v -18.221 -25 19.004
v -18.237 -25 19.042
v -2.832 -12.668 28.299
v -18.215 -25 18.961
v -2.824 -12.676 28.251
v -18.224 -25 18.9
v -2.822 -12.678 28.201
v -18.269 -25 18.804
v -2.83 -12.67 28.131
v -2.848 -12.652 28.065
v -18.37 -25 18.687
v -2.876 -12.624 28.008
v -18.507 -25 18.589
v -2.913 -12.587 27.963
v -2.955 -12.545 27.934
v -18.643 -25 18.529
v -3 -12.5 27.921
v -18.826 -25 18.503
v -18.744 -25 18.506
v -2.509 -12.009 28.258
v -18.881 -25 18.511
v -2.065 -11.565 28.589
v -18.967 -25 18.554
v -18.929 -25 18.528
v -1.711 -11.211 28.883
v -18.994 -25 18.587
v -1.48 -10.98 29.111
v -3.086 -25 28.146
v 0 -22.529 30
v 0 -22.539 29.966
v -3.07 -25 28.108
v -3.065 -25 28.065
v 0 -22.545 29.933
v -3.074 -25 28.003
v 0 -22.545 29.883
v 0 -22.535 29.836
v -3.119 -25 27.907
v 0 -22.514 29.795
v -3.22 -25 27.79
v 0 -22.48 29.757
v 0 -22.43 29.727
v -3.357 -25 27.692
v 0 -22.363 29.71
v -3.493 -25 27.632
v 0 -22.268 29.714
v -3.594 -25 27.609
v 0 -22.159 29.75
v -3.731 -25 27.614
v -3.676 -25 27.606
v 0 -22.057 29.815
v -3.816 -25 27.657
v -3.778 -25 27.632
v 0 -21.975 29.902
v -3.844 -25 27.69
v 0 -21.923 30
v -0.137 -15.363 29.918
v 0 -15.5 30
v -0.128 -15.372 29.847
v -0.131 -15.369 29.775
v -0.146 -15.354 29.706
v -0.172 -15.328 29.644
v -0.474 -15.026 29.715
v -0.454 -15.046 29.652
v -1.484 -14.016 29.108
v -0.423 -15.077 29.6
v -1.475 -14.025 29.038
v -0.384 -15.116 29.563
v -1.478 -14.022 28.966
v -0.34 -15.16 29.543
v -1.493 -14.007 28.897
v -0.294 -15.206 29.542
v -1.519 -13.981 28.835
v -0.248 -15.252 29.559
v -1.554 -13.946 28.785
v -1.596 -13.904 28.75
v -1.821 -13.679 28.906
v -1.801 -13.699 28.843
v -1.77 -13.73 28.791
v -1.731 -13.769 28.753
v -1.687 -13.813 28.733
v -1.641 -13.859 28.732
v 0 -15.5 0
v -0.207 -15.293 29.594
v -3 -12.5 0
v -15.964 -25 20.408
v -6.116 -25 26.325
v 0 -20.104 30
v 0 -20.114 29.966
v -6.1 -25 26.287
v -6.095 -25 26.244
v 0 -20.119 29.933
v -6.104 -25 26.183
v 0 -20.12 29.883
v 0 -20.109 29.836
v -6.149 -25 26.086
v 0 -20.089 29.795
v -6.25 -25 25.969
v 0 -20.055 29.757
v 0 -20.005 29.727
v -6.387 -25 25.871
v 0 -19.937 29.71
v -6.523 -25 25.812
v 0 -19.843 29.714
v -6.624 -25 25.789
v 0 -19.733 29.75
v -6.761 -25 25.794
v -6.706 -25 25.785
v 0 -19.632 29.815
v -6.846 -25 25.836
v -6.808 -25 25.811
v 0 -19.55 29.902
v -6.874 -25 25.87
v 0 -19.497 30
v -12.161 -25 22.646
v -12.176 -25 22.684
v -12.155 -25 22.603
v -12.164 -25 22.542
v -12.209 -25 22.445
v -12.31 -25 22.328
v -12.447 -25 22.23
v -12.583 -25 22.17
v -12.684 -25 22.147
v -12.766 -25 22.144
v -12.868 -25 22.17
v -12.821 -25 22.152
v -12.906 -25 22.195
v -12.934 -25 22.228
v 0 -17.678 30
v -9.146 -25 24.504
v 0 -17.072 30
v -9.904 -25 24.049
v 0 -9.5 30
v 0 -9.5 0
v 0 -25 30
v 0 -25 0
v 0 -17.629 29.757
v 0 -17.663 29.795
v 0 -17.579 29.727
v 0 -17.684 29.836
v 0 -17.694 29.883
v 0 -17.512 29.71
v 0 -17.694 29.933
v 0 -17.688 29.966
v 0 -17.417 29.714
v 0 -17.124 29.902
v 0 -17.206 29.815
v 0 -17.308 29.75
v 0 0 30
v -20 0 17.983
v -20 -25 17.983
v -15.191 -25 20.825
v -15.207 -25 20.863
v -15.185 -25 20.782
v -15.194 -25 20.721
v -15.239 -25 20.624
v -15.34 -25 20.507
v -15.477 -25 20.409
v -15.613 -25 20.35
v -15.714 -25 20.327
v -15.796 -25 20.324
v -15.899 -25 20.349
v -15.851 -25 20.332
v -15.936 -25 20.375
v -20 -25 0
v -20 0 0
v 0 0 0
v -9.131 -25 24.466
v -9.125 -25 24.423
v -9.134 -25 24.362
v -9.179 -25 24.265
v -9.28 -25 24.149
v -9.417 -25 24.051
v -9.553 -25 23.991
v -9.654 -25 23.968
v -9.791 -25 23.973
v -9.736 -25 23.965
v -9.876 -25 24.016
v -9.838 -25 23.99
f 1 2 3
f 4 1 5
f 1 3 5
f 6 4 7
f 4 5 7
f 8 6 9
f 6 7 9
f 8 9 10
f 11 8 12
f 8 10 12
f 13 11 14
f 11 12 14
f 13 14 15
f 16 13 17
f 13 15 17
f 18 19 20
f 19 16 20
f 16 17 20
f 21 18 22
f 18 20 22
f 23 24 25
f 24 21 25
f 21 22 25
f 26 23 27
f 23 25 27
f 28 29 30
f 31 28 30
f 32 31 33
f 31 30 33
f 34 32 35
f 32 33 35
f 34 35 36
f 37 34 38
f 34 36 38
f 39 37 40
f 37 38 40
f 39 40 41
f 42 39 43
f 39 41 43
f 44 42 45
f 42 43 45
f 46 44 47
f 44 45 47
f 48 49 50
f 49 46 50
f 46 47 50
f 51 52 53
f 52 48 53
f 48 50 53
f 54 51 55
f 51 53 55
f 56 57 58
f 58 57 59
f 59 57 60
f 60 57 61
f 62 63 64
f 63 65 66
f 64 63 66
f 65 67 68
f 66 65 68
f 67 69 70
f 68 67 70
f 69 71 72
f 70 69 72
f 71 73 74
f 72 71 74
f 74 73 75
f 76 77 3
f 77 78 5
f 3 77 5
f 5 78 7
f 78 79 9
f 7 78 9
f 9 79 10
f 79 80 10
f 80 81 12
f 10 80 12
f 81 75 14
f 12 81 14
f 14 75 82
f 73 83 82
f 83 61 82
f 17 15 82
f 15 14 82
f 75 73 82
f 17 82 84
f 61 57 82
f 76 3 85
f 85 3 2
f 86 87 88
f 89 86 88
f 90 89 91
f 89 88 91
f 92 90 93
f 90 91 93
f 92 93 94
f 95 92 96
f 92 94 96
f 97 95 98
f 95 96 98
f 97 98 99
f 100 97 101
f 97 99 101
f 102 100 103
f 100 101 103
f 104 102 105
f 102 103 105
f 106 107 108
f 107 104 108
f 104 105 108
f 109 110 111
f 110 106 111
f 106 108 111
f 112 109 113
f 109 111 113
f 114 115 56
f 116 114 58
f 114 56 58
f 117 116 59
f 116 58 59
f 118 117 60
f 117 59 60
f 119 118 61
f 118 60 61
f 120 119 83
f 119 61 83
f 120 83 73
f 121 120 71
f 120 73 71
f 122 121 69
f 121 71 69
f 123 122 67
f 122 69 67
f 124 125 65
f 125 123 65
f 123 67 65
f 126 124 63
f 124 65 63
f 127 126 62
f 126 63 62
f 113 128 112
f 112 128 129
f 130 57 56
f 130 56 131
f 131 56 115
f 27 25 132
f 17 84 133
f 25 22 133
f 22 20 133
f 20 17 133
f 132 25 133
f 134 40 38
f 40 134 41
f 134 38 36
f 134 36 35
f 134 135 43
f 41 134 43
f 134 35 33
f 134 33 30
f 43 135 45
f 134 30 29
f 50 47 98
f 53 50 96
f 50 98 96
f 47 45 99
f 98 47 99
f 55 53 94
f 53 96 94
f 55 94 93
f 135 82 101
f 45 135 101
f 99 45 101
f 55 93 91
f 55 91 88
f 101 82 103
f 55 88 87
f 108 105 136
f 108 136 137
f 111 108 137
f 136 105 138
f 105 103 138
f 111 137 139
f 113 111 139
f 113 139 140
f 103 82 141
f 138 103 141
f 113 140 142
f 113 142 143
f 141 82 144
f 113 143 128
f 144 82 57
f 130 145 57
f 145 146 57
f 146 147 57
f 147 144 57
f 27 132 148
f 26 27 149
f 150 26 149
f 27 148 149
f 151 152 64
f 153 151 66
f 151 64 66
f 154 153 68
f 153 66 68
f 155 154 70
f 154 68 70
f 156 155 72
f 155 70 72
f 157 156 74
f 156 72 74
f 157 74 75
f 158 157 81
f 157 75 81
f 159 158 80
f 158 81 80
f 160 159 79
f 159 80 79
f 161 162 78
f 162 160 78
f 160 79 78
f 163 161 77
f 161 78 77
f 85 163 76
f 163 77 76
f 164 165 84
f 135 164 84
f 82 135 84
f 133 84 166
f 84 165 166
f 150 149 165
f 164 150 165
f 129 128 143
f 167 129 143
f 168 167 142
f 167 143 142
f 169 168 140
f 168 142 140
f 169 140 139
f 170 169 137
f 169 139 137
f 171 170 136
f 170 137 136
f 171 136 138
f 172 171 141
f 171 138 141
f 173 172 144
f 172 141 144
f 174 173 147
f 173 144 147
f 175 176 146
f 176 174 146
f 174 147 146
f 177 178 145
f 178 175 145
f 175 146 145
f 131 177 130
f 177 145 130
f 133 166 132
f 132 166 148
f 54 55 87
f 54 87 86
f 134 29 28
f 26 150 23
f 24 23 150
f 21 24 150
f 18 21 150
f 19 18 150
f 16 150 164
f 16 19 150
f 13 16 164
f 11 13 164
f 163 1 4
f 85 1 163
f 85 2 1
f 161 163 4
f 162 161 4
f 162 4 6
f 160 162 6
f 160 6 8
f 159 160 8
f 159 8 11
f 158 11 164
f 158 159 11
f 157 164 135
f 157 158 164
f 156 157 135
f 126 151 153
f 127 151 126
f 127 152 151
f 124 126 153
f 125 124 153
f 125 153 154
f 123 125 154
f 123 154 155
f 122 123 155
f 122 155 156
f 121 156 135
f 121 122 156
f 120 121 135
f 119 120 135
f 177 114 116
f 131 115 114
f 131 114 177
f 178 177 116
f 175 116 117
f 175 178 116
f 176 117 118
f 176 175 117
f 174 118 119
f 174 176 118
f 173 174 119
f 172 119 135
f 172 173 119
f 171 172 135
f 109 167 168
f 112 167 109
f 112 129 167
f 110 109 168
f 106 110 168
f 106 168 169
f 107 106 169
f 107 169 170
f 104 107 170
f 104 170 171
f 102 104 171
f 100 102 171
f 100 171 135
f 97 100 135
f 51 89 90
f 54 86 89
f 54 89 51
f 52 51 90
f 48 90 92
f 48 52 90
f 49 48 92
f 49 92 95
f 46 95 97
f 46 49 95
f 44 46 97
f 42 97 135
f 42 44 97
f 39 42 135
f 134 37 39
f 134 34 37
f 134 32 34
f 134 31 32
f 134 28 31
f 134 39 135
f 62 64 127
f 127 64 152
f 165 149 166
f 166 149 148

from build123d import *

# Parameters (mm, degrees)
F1_DEPTH = 25
F3_DEPTH = 30.001
F6_R     = 0.25
F7_DEPTH = 41.0214813745


with BuildPart() as f1:
    # F0 (on Front) → F1 (new body)
    with BuildSketch(Plane.XZ):
        Polygon((-20, 0), (0, 0), (0, 30), (-20, 17.9827876194), align=None)
    extrude(amount=F1_DEPTH)

    # F2 (on face) → F3 (cut, through all)
    with BuildSketch(Plane(origin=(0, 0, 0), x_dir=(1, 0, 0), z_dir=(0, 0, -1))):
        Polygon((0, 9.5), (0, 15.5), (-3, 12.5), align=None)
    extrude(amount=-F3_DEPTH, mode=Mode.SUBTRACT)

    # F6 (on line) → F7 (cut, through all)
    with BuildSketch(Plane(origin=(9.0046896383, 7.208208517, 5.4105633902), x_dir=(-0.4849657456, 0.8245581362, -0.2913968181), z_dir=(0.7067842719, 0.5657772353, 0.4246788351))):
        with Locations((-17.0687173915, 25.7150190211)):
            Circle(F6_R)
        with Locations((-19.0687173915, 25.7150190211)):
            Circle(F6_R)
        with Locations((-21.0687173915, 25.7150190211)):
            Circle(F6_R)
        with Locations((-23.0687173915, 25.7150190211)):
            Circle(F6_R)
        with Locations((-25.0687173915, 25.7150190211)):
            Circle(F6_R)
        with Locations((-27.0687173915, 25.7150190211)):
            Circle(F6_R)
    extrude(amount=-F7_DEPTH, mode=Mode.SUBTRACT)


solid = f1.part
